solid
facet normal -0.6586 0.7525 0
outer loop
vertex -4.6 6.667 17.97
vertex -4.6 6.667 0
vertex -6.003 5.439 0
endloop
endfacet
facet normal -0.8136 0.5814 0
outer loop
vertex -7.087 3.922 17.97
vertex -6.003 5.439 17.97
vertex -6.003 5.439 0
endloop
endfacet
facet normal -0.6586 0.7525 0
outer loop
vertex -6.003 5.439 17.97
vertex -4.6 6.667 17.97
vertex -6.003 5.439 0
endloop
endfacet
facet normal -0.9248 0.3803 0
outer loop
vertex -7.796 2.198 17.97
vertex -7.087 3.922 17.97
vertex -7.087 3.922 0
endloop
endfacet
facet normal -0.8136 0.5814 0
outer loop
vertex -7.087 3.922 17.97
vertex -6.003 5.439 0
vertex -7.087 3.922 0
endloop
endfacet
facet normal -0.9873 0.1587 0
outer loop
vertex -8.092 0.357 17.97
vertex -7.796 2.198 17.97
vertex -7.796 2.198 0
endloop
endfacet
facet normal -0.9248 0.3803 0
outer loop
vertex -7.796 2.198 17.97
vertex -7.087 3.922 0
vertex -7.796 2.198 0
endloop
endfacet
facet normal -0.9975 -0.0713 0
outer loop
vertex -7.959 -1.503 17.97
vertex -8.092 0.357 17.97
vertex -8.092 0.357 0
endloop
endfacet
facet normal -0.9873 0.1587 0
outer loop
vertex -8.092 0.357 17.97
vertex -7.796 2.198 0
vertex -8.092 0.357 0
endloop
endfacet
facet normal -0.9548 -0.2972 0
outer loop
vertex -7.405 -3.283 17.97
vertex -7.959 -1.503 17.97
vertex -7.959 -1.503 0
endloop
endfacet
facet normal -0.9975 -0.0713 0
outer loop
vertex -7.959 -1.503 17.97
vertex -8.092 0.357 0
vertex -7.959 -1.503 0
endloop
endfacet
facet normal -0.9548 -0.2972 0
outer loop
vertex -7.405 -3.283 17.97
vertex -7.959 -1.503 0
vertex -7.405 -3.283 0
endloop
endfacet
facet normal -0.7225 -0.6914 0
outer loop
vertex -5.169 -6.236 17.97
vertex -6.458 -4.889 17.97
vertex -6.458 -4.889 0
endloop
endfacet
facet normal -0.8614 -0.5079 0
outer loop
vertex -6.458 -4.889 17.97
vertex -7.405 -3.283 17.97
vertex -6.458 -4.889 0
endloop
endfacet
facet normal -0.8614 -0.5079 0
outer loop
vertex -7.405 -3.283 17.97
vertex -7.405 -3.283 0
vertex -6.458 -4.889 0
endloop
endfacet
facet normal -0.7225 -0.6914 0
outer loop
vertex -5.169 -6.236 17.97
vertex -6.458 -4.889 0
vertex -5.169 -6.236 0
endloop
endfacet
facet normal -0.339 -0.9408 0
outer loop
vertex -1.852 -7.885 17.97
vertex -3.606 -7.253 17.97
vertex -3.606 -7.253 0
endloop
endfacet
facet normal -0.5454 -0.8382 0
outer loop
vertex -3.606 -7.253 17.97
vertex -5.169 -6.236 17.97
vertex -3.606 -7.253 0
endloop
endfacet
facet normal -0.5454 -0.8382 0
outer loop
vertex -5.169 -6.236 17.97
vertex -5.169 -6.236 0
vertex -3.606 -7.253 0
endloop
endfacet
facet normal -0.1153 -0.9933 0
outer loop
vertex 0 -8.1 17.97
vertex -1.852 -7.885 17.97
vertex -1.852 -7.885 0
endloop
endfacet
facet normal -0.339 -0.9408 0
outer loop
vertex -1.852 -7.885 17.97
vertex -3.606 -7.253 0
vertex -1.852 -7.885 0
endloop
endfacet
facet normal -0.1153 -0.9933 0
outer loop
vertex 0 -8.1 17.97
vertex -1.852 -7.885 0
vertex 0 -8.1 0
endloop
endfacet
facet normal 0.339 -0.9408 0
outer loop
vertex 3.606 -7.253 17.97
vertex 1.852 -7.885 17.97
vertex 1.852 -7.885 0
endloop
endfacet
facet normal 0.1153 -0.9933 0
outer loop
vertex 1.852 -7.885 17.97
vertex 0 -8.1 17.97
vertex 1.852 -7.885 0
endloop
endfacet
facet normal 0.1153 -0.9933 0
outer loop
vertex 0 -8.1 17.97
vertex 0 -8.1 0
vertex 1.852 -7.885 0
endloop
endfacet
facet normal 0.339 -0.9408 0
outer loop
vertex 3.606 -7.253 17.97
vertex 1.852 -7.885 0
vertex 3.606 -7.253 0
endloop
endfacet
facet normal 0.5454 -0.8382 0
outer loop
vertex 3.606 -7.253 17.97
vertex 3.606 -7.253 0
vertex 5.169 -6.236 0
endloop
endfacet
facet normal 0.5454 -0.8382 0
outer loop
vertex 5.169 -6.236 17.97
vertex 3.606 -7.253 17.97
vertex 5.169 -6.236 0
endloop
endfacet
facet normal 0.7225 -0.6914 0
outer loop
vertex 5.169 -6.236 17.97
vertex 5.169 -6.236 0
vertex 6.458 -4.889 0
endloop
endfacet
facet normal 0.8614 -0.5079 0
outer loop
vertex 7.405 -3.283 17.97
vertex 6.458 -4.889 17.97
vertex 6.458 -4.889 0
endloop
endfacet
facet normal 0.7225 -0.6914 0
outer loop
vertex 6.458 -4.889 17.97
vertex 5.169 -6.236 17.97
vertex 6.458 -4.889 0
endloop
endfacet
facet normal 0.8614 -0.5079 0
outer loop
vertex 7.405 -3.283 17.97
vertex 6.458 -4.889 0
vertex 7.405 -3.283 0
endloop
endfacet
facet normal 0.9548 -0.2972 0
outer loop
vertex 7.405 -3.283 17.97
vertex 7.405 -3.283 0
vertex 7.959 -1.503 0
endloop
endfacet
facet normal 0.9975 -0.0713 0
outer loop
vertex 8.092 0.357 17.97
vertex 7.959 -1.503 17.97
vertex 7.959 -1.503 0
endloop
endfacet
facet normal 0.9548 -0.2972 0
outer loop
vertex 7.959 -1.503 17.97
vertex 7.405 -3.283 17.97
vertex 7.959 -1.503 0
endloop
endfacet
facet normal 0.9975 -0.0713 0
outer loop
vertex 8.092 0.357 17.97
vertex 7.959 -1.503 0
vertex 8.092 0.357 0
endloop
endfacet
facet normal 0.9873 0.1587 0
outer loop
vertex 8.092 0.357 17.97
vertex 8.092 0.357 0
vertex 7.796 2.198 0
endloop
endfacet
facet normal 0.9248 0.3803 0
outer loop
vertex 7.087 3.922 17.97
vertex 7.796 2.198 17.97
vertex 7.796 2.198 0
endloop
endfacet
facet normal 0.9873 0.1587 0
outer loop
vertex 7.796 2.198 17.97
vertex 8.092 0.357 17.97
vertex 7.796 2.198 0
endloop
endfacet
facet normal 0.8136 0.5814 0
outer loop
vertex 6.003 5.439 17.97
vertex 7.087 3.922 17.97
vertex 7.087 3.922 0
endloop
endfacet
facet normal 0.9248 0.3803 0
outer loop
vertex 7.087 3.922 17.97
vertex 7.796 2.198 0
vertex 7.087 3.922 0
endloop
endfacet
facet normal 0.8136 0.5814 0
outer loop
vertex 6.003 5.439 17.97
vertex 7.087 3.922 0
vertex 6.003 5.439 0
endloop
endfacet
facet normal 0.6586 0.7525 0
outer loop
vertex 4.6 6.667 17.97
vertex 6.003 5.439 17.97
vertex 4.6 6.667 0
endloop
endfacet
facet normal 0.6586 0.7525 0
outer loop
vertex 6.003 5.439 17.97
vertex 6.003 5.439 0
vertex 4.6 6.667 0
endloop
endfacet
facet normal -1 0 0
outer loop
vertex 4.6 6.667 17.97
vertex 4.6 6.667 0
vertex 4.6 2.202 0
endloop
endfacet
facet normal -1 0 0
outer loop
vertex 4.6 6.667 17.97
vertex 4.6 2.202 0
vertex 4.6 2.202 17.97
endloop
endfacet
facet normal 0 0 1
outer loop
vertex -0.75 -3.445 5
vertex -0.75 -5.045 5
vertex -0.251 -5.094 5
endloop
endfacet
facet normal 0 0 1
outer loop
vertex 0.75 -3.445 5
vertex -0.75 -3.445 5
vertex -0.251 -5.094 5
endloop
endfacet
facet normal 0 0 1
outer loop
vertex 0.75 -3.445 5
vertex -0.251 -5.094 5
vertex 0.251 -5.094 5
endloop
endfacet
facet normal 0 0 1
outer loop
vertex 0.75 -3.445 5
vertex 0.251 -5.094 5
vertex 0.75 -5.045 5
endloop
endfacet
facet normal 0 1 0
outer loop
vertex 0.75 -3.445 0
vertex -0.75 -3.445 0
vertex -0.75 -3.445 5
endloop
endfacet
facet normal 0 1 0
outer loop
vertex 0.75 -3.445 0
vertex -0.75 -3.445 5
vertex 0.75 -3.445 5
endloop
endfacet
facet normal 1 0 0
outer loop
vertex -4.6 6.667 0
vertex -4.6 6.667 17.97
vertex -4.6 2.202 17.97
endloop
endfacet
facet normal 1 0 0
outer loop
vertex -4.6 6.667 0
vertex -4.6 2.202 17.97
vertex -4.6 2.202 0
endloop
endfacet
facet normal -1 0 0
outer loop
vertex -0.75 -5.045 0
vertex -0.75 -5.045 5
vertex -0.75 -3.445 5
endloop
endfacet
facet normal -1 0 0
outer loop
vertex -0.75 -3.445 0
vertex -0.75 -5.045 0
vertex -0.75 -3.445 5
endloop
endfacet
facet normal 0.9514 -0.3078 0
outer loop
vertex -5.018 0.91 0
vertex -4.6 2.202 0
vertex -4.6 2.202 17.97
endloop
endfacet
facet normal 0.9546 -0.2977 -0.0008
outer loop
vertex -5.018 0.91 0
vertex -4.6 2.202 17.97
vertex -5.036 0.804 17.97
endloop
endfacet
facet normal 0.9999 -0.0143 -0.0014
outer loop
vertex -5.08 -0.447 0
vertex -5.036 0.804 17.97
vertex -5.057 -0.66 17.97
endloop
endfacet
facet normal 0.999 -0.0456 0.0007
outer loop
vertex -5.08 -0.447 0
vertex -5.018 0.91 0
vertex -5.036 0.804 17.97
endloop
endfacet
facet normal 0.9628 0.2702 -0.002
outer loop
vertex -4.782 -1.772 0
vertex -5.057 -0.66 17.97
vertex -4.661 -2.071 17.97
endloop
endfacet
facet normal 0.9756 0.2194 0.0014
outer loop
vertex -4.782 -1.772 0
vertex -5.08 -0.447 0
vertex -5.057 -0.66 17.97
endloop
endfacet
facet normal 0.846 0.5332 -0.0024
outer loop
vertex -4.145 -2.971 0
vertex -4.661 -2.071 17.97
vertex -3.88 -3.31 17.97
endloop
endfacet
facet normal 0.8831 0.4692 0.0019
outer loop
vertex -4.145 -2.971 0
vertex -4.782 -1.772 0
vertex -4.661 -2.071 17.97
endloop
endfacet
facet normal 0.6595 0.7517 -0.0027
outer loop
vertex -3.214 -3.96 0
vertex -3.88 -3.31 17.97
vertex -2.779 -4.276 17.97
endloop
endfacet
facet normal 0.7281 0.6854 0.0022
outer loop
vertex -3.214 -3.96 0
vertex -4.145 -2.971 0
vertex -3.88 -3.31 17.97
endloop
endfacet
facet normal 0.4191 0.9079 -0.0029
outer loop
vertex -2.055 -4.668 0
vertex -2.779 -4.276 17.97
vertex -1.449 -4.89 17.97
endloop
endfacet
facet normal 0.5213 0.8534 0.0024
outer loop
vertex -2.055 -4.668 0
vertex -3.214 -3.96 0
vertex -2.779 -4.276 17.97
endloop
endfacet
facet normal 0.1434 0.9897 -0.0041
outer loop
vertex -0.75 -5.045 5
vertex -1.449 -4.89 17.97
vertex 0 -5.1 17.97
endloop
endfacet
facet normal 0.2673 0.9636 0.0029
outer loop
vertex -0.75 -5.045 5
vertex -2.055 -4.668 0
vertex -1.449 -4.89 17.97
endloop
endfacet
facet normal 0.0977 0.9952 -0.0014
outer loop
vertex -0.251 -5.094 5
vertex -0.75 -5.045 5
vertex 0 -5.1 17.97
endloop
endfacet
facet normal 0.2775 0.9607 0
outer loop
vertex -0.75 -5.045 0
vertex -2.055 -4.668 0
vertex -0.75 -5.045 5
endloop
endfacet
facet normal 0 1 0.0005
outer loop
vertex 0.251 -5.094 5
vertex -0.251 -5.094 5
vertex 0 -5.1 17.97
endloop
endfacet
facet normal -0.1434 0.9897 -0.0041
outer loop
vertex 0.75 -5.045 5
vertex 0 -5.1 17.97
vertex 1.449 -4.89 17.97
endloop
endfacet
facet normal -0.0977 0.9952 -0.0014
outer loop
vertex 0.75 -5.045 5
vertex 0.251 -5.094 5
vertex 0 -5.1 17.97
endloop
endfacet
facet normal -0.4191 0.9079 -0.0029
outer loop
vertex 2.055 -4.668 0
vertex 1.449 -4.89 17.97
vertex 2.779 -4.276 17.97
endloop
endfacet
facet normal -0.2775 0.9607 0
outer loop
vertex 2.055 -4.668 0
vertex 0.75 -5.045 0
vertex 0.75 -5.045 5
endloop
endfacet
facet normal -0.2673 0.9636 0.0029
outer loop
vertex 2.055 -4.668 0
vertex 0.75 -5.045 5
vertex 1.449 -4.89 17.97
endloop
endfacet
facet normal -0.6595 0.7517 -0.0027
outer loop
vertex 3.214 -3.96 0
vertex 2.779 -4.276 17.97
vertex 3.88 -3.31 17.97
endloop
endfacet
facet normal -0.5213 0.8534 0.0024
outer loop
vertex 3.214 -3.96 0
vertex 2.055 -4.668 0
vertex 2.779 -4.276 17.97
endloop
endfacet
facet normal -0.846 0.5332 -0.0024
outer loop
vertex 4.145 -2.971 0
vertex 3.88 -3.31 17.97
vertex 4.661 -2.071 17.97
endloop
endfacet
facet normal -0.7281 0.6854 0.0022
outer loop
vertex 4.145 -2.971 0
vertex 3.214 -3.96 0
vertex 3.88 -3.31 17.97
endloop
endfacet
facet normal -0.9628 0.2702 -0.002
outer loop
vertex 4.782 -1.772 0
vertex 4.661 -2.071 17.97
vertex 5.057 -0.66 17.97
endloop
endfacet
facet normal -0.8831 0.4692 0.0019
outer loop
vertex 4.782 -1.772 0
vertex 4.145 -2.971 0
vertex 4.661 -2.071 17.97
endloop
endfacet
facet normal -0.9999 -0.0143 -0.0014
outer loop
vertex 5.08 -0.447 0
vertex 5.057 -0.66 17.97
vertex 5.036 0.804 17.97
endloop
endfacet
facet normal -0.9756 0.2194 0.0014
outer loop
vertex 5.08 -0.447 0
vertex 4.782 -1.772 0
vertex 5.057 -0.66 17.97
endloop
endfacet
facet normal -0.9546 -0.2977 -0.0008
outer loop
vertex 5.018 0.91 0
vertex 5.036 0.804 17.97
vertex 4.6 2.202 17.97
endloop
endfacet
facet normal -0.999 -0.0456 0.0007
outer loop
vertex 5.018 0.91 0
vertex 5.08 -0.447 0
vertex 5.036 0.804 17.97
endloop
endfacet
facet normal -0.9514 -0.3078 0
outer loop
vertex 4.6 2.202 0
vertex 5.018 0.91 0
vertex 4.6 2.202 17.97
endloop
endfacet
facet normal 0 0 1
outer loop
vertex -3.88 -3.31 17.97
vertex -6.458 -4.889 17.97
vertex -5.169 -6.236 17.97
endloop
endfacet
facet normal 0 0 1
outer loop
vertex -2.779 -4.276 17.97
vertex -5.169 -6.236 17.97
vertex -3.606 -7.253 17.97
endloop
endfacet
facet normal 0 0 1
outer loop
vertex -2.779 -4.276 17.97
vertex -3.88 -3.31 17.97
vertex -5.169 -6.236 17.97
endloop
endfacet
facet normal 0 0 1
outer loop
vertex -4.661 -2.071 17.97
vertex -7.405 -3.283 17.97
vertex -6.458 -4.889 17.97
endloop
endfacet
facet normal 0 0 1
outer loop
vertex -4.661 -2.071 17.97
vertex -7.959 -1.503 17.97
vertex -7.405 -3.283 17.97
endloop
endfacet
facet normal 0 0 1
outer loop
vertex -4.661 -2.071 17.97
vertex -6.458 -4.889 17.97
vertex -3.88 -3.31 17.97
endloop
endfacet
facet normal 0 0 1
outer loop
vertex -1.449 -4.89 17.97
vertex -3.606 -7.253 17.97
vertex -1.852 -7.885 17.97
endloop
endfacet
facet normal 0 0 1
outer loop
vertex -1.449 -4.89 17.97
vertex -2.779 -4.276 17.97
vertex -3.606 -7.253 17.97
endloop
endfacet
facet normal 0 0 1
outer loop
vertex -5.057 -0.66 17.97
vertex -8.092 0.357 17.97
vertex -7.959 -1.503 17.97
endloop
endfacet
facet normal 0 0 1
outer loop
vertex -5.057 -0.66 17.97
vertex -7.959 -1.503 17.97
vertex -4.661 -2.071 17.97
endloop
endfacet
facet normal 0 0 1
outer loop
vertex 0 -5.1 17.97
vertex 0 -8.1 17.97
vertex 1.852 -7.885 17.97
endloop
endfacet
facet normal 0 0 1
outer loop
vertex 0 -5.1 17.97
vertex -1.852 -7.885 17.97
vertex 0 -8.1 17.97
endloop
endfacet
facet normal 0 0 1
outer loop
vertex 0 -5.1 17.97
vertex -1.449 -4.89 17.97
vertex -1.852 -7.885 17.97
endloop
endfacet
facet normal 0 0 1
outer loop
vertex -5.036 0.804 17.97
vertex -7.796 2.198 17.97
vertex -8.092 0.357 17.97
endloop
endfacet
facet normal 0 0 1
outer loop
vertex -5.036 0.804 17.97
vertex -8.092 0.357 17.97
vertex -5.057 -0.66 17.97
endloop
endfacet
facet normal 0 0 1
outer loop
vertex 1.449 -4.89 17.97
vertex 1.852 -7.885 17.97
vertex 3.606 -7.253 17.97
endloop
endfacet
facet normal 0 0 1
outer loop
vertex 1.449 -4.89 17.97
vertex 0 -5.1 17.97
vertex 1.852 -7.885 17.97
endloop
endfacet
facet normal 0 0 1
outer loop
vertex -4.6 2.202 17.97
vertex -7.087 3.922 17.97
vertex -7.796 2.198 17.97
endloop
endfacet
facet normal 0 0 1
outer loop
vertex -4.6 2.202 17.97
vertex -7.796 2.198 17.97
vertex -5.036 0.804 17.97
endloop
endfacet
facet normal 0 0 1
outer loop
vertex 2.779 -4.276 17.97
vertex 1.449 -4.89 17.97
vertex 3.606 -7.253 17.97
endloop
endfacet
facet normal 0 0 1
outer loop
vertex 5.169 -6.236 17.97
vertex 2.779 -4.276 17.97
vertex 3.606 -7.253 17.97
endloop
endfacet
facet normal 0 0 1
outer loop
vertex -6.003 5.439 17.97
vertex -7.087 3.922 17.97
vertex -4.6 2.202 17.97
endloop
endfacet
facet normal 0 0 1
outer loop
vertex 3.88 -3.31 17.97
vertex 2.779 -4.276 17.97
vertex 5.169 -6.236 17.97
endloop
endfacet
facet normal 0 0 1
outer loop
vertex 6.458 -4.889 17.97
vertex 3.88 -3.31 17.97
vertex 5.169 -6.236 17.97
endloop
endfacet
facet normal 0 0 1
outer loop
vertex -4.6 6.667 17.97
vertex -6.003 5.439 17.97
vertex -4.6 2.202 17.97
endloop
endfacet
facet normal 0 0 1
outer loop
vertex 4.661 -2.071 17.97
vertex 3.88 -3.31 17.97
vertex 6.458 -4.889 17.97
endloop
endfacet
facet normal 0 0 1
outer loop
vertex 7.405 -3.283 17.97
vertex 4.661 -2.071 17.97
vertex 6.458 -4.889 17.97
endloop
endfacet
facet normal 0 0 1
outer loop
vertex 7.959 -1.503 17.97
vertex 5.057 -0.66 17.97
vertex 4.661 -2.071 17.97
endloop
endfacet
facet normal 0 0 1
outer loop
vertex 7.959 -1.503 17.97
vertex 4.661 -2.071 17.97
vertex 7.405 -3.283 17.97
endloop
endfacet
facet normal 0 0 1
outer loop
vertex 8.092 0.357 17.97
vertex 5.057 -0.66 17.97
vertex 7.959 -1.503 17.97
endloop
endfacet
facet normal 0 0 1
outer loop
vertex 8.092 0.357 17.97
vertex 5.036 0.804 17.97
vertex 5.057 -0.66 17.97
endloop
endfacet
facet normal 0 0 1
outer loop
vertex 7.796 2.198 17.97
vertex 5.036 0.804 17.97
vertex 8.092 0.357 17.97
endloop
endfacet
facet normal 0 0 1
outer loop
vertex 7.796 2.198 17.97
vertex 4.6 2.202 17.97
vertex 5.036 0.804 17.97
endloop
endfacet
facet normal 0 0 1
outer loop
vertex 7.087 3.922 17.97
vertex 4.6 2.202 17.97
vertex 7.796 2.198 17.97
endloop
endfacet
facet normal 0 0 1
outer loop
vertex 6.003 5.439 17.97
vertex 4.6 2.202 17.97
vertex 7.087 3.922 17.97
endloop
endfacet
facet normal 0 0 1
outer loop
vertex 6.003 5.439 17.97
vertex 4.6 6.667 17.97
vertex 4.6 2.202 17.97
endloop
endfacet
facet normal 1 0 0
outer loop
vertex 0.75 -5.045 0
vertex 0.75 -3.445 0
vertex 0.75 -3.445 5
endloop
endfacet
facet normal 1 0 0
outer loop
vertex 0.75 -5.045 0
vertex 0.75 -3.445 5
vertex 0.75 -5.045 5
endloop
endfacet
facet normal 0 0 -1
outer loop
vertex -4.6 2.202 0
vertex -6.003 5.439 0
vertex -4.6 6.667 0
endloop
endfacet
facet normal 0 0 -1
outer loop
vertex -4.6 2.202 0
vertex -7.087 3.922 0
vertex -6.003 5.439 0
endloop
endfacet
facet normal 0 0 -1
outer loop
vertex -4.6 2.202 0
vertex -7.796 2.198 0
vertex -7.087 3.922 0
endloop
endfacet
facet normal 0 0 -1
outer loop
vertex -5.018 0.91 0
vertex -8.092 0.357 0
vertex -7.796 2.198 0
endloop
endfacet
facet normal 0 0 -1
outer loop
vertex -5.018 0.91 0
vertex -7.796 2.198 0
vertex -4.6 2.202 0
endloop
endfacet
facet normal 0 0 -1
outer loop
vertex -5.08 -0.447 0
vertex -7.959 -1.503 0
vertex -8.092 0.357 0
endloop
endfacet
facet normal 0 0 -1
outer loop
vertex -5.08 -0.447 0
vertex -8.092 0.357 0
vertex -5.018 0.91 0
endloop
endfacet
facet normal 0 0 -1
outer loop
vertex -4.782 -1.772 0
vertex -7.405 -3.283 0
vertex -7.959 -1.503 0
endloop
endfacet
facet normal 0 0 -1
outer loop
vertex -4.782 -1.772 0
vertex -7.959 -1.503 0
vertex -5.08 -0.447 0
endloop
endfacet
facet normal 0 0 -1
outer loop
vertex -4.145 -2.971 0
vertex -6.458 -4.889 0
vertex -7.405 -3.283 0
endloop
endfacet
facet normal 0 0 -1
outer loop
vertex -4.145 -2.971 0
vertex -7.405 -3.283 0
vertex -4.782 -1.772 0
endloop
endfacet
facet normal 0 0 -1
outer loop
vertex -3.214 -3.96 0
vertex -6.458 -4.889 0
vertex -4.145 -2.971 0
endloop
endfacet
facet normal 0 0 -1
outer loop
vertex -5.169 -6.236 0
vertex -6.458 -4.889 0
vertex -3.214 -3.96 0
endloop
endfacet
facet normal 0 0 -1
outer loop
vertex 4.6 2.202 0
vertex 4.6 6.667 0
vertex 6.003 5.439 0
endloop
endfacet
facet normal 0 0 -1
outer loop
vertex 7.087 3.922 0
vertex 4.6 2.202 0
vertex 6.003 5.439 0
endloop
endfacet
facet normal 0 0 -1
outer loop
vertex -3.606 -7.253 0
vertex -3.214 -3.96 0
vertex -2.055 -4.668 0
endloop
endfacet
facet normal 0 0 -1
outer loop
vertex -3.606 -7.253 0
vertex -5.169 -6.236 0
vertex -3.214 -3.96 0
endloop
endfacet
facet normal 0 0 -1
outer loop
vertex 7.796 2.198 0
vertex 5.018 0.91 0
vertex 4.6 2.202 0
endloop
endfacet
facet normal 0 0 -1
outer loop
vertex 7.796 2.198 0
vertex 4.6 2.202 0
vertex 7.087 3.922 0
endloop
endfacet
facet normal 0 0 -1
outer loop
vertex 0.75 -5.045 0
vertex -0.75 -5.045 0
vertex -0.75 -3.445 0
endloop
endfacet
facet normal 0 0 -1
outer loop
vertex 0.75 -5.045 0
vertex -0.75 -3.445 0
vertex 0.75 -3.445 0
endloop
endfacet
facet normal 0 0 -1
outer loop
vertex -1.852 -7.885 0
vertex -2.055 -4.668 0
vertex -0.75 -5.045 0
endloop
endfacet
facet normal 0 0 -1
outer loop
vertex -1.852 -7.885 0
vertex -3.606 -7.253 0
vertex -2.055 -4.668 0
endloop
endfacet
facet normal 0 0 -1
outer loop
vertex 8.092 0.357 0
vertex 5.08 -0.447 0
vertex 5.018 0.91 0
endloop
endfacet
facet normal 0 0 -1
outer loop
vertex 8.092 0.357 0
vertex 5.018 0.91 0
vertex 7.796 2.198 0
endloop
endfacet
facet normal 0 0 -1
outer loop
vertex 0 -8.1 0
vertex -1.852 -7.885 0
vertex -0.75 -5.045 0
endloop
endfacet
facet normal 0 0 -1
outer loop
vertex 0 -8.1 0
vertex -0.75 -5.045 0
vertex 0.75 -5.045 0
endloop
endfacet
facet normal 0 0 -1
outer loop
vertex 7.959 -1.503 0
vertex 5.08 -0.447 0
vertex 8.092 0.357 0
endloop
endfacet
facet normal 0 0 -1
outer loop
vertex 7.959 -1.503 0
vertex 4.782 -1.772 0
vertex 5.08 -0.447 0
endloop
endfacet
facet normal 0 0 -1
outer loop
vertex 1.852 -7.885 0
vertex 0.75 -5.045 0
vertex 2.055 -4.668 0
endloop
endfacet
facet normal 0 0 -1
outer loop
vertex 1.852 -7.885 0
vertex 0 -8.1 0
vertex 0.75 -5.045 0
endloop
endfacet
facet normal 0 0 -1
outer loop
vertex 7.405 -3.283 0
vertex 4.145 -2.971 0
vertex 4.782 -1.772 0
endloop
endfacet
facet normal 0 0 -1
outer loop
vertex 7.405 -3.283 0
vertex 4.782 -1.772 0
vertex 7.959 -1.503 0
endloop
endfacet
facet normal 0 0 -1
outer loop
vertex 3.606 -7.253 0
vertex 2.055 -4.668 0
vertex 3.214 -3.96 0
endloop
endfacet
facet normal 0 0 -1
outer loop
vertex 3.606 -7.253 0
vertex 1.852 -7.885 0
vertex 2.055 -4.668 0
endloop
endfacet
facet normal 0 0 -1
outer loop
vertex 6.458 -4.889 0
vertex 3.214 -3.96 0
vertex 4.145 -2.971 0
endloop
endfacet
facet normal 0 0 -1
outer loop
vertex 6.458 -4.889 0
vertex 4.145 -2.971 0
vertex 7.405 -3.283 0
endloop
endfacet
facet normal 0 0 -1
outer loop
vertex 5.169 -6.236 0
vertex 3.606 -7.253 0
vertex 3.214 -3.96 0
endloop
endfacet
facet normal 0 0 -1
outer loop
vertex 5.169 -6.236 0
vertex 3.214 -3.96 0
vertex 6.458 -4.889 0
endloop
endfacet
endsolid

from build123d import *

# Parameters (mm, degrees)
F0_R          = 8.1
F0_R_2        = 5.1
F1_DEPTH      = 17.97
F4_DEPTH      = 7.6
F4_DEPTH_BACK = 0.4
F6_DEPTH      = 5


with BuildPart() as f1:
    # F0 (on Top) → F1 (new body)
    with BuildSketch(Plane.XY):
        Circle(F0_R)
        Circle(F0_R_2, mode=Mode.SUBTRACT)
    extrude(amount=F1_DEPTH)

    # F3 (on offset) → F4 (cut, two sides)
    with BuildSketch(Plane.XZ.offset(-9.09)) as f4_sk:
        Polygon((4.6, 0), (4.6, 17.97), (0, 17.97), (-4.6, 17.97), (-4.6, 0), (0, 0), align=None)
    extrude(amount=F4_DEPTH, mode=Mode.SUBTRACT)
    extrude(f4_sk.sketch, amount=-F4_DEPTH_BACK, mode=Mode.SUBTRACT)

    # F5 (on face) → F6 (join)
    with BuildSketch(Plane(origin=(0, 0, 0), x_dir=(1, 0, 0), z_dir=(0, 0, -1))):
        Polygon((0, 5.044552), (-0.75, 5.044552), (-0.75, 3.444552), (0, 3.444552), (0.75, 3.444552), (0.75, 5.044552), align=None)
        with BuildLine():
            ThreePointArc((0.75, 5.044552), (0, 5.1), (-0.75, 5.044552))
            Line((-0.75, 5.044552), (0, 5.044552))
            Line((0, 5.044552), (0.75, 5.044552))
        make_face()
    extrude(amount=-F6_DEPTH)


solid = f1.part
